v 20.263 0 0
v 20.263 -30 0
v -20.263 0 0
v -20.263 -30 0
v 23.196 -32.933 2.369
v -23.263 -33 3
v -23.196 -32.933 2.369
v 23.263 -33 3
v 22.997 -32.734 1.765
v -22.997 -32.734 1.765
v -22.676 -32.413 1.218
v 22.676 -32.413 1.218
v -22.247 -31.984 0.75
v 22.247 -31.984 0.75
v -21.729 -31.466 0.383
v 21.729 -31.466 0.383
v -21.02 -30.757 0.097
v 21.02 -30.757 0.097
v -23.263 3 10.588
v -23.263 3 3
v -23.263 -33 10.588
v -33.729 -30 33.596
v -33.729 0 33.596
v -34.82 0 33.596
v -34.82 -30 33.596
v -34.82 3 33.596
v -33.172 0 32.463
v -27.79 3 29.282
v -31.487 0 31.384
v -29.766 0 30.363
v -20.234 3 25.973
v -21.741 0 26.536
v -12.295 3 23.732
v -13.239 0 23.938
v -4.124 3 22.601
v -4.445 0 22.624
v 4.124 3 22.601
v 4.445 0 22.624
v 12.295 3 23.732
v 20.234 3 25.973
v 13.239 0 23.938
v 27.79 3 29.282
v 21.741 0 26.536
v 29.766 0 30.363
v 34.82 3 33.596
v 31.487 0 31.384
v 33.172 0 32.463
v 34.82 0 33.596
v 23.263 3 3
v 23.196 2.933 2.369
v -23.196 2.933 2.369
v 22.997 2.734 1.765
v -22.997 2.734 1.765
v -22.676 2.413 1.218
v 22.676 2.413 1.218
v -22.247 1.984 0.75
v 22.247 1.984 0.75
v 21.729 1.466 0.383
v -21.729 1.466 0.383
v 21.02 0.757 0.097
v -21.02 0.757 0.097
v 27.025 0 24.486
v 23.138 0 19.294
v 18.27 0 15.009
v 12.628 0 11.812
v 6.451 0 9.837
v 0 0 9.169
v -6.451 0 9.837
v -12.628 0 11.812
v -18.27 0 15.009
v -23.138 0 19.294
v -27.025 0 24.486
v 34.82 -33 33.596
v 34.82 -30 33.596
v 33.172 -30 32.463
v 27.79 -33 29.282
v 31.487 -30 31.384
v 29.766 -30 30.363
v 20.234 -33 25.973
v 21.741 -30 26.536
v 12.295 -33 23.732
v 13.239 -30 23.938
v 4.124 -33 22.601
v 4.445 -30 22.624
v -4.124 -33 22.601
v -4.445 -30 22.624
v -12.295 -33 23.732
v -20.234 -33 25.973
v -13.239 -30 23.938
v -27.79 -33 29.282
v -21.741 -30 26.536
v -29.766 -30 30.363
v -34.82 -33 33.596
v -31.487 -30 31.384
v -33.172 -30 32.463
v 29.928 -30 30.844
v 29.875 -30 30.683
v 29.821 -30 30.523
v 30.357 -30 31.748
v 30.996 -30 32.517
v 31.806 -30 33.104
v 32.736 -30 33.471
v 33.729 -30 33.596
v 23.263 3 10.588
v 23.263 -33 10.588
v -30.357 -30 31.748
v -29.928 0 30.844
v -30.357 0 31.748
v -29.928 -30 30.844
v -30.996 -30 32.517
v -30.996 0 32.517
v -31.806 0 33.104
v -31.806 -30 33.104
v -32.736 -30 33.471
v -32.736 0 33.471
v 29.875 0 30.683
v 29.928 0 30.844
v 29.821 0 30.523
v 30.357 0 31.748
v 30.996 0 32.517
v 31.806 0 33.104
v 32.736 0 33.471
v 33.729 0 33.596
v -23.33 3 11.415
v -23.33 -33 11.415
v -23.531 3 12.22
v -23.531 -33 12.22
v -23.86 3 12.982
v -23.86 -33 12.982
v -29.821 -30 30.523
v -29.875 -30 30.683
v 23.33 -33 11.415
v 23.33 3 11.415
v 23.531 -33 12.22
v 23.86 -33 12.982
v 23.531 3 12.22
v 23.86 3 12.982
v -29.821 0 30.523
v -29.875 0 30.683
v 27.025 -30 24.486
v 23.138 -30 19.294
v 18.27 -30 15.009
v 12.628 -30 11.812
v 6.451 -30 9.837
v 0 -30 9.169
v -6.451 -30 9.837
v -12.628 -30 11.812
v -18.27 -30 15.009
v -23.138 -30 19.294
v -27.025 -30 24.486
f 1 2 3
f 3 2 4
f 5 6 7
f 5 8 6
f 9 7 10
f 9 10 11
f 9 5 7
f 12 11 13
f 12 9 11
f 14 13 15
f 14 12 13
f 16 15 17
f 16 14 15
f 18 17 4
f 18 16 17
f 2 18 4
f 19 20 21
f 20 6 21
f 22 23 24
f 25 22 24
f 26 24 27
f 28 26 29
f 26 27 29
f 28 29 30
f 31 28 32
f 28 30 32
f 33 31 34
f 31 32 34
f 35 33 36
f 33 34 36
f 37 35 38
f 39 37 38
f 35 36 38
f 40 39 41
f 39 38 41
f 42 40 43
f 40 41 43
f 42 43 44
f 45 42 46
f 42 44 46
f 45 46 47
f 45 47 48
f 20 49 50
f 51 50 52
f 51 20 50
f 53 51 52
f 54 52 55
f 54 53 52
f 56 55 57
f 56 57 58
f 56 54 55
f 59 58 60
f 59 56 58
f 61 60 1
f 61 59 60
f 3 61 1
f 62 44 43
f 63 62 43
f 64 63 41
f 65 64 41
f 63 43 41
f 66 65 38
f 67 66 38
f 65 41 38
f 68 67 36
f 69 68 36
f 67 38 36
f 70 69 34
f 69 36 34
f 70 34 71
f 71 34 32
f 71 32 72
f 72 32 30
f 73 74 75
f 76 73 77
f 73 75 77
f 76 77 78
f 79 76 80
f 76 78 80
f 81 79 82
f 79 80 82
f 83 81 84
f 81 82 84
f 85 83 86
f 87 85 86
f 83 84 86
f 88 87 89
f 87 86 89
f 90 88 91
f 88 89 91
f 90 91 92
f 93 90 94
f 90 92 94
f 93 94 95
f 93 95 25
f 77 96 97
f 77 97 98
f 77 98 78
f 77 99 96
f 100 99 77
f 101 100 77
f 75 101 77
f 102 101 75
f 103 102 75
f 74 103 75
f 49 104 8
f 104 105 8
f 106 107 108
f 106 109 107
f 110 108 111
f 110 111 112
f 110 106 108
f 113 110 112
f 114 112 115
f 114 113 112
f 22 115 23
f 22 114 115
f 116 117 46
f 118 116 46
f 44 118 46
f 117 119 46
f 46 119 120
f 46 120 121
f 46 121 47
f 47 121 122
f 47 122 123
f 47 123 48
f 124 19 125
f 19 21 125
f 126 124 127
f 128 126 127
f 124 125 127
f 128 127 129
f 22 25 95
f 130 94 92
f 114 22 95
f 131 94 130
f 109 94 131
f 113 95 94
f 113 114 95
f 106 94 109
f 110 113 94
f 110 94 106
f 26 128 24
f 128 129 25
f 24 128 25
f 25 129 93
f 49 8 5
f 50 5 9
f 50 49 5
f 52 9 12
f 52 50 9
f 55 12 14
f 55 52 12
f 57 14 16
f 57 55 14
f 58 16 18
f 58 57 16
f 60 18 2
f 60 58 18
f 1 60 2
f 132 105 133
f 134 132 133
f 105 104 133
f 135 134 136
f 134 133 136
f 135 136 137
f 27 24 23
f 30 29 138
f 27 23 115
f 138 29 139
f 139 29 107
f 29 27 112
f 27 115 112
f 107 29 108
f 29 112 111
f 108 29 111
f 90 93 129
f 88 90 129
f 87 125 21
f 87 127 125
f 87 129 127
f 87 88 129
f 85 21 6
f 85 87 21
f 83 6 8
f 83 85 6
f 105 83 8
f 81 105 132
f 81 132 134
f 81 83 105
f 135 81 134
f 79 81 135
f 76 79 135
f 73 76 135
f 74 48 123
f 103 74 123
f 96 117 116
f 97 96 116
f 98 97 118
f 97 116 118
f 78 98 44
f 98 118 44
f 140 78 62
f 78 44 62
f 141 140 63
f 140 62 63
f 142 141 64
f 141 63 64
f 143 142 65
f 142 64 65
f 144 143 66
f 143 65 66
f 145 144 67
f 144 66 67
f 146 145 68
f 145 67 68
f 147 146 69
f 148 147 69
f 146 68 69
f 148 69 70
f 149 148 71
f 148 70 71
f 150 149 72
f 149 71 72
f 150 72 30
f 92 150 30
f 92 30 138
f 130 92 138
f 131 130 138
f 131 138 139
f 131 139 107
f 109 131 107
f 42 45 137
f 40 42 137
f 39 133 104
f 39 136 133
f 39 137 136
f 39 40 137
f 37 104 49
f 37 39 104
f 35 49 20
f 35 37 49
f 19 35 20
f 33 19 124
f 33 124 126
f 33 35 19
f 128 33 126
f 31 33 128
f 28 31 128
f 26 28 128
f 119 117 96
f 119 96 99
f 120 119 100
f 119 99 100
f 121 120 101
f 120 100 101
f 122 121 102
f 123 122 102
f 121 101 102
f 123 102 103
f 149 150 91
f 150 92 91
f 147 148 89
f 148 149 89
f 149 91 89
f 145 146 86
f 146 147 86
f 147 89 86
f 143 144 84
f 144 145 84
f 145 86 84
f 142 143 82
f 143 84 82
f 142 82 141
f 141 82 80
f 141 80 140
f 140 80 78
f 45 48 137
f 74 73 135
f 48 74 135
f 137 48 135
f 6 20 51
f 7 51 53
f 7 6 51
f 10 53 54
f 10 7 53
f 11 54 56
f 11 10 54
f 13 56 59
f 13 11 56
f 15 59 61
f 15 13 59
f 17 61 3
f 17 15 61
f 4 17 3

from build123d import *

# Parameters (mm, degrees)
F1_DEPTH = 30
F3_DEPTH = 3
F5_DEPTH = 3
F6_R     = 4
F7_R     = 3
F8_R     = 5.1


with BuildPart() as f1:
    # F0 (on Front) → F1 (new body)
    with BuildSketch(Plane.XZ):
        with BuildLine():
            Line((-23.262718, 0), (0, 0))
            Line((0, 0), (23.262718, 0))
            Line((23.262718, 0), (23.262718, 11.85973))
            Line((23.262718, 11.85973), (34.820285, 33.596352))
            Line((34.820285, 33.596352), (30.695623, 33.596352))
            ThreePointArc((30.695623, 33.596352), (0, 9.169452), (-30.695623, 33.596352))
            Line((-30.695623, 33.596352), (-34.820285, 33.596352))
            Line((-34.820285, 33.596352), (-23.262718, 11.85973))
            Line((-23.262718, 11.85973), (-23.262718, 0))
        make_face()
    extrude(amount=F1_DEPTH)

    # F2 (on face) → F3 (join)
    with BuildSketch(Plane.XZ.offset(30)):
        with BuildLine():
            ThreePointArc((34.820285, 33.596352), (0, 22.458891), (-34.820285, 33.596352))
            Line((-34.820285, 33.596352), (-23.262718, 11.85973))
            Line((-23.262718, 11.85973), (-23.262718, 0))
            Line((-23.262718, 0), (23.262718, 0))
            Line((23.262718, 0), (23.262718, 11.85973))
            Line((23.262718, 11.85973), (34.820285, 33.596352))
        make_face()
    extrude(amount=F3_DEPTH)

    # F4 (on face) → F5 (join)
    with BuildSketch(Plane(origin=(0, 0, 0), x_dir=(-1, 0, 0), z_dir=(0, 1, 0))):
        with BuildLine():
            ThreePointArc((34.820285, 33.596352), (0, 22.458891), (-34.820285, 33.596352))
            Line((-34.820285, 33.596352), (-23.262718, 11.85973))
            Line((-23.262718, 11.85973), (-23.262718, 0))
            Line((-23.262718, 0), (23.262718, 0))
            Line((23.262718, 0), (23.262718, 11.85973))
            Line((23.262718, 11.85973), (34.820285, 33.596352))
        make_face()
    extrude(amount=F5_DEPTH)

    # F6
    f6_edges = [f1.edges().sort_by_distance(p)[0] for p in [
        (30.695623, -15, 33.596352),
        (-30.695623, -15, 33.596352),
    ]]
    fillet(f6_edges, radius=F6_R)

    # F7
    f7_edges = [f1.edges().sort_by_distance(p)[0] for p in [
        (23.262718, -15, 0),
        (0, 3, 0),
        (-23.262718, -15, 0),
        (0, -33, 0),
    ]]
    fillet(f7_edges, radius=F7_R)

    # F8
    f8_edges = [f1.edges().sort_by_distance(p)[0] for p in [
        (-23.262718, -15, 11.85973),
        (23.262718, -15, 11.85973),
    ]]
    fillet(f8_edges, radius=F8_R)


solid = f1.part
